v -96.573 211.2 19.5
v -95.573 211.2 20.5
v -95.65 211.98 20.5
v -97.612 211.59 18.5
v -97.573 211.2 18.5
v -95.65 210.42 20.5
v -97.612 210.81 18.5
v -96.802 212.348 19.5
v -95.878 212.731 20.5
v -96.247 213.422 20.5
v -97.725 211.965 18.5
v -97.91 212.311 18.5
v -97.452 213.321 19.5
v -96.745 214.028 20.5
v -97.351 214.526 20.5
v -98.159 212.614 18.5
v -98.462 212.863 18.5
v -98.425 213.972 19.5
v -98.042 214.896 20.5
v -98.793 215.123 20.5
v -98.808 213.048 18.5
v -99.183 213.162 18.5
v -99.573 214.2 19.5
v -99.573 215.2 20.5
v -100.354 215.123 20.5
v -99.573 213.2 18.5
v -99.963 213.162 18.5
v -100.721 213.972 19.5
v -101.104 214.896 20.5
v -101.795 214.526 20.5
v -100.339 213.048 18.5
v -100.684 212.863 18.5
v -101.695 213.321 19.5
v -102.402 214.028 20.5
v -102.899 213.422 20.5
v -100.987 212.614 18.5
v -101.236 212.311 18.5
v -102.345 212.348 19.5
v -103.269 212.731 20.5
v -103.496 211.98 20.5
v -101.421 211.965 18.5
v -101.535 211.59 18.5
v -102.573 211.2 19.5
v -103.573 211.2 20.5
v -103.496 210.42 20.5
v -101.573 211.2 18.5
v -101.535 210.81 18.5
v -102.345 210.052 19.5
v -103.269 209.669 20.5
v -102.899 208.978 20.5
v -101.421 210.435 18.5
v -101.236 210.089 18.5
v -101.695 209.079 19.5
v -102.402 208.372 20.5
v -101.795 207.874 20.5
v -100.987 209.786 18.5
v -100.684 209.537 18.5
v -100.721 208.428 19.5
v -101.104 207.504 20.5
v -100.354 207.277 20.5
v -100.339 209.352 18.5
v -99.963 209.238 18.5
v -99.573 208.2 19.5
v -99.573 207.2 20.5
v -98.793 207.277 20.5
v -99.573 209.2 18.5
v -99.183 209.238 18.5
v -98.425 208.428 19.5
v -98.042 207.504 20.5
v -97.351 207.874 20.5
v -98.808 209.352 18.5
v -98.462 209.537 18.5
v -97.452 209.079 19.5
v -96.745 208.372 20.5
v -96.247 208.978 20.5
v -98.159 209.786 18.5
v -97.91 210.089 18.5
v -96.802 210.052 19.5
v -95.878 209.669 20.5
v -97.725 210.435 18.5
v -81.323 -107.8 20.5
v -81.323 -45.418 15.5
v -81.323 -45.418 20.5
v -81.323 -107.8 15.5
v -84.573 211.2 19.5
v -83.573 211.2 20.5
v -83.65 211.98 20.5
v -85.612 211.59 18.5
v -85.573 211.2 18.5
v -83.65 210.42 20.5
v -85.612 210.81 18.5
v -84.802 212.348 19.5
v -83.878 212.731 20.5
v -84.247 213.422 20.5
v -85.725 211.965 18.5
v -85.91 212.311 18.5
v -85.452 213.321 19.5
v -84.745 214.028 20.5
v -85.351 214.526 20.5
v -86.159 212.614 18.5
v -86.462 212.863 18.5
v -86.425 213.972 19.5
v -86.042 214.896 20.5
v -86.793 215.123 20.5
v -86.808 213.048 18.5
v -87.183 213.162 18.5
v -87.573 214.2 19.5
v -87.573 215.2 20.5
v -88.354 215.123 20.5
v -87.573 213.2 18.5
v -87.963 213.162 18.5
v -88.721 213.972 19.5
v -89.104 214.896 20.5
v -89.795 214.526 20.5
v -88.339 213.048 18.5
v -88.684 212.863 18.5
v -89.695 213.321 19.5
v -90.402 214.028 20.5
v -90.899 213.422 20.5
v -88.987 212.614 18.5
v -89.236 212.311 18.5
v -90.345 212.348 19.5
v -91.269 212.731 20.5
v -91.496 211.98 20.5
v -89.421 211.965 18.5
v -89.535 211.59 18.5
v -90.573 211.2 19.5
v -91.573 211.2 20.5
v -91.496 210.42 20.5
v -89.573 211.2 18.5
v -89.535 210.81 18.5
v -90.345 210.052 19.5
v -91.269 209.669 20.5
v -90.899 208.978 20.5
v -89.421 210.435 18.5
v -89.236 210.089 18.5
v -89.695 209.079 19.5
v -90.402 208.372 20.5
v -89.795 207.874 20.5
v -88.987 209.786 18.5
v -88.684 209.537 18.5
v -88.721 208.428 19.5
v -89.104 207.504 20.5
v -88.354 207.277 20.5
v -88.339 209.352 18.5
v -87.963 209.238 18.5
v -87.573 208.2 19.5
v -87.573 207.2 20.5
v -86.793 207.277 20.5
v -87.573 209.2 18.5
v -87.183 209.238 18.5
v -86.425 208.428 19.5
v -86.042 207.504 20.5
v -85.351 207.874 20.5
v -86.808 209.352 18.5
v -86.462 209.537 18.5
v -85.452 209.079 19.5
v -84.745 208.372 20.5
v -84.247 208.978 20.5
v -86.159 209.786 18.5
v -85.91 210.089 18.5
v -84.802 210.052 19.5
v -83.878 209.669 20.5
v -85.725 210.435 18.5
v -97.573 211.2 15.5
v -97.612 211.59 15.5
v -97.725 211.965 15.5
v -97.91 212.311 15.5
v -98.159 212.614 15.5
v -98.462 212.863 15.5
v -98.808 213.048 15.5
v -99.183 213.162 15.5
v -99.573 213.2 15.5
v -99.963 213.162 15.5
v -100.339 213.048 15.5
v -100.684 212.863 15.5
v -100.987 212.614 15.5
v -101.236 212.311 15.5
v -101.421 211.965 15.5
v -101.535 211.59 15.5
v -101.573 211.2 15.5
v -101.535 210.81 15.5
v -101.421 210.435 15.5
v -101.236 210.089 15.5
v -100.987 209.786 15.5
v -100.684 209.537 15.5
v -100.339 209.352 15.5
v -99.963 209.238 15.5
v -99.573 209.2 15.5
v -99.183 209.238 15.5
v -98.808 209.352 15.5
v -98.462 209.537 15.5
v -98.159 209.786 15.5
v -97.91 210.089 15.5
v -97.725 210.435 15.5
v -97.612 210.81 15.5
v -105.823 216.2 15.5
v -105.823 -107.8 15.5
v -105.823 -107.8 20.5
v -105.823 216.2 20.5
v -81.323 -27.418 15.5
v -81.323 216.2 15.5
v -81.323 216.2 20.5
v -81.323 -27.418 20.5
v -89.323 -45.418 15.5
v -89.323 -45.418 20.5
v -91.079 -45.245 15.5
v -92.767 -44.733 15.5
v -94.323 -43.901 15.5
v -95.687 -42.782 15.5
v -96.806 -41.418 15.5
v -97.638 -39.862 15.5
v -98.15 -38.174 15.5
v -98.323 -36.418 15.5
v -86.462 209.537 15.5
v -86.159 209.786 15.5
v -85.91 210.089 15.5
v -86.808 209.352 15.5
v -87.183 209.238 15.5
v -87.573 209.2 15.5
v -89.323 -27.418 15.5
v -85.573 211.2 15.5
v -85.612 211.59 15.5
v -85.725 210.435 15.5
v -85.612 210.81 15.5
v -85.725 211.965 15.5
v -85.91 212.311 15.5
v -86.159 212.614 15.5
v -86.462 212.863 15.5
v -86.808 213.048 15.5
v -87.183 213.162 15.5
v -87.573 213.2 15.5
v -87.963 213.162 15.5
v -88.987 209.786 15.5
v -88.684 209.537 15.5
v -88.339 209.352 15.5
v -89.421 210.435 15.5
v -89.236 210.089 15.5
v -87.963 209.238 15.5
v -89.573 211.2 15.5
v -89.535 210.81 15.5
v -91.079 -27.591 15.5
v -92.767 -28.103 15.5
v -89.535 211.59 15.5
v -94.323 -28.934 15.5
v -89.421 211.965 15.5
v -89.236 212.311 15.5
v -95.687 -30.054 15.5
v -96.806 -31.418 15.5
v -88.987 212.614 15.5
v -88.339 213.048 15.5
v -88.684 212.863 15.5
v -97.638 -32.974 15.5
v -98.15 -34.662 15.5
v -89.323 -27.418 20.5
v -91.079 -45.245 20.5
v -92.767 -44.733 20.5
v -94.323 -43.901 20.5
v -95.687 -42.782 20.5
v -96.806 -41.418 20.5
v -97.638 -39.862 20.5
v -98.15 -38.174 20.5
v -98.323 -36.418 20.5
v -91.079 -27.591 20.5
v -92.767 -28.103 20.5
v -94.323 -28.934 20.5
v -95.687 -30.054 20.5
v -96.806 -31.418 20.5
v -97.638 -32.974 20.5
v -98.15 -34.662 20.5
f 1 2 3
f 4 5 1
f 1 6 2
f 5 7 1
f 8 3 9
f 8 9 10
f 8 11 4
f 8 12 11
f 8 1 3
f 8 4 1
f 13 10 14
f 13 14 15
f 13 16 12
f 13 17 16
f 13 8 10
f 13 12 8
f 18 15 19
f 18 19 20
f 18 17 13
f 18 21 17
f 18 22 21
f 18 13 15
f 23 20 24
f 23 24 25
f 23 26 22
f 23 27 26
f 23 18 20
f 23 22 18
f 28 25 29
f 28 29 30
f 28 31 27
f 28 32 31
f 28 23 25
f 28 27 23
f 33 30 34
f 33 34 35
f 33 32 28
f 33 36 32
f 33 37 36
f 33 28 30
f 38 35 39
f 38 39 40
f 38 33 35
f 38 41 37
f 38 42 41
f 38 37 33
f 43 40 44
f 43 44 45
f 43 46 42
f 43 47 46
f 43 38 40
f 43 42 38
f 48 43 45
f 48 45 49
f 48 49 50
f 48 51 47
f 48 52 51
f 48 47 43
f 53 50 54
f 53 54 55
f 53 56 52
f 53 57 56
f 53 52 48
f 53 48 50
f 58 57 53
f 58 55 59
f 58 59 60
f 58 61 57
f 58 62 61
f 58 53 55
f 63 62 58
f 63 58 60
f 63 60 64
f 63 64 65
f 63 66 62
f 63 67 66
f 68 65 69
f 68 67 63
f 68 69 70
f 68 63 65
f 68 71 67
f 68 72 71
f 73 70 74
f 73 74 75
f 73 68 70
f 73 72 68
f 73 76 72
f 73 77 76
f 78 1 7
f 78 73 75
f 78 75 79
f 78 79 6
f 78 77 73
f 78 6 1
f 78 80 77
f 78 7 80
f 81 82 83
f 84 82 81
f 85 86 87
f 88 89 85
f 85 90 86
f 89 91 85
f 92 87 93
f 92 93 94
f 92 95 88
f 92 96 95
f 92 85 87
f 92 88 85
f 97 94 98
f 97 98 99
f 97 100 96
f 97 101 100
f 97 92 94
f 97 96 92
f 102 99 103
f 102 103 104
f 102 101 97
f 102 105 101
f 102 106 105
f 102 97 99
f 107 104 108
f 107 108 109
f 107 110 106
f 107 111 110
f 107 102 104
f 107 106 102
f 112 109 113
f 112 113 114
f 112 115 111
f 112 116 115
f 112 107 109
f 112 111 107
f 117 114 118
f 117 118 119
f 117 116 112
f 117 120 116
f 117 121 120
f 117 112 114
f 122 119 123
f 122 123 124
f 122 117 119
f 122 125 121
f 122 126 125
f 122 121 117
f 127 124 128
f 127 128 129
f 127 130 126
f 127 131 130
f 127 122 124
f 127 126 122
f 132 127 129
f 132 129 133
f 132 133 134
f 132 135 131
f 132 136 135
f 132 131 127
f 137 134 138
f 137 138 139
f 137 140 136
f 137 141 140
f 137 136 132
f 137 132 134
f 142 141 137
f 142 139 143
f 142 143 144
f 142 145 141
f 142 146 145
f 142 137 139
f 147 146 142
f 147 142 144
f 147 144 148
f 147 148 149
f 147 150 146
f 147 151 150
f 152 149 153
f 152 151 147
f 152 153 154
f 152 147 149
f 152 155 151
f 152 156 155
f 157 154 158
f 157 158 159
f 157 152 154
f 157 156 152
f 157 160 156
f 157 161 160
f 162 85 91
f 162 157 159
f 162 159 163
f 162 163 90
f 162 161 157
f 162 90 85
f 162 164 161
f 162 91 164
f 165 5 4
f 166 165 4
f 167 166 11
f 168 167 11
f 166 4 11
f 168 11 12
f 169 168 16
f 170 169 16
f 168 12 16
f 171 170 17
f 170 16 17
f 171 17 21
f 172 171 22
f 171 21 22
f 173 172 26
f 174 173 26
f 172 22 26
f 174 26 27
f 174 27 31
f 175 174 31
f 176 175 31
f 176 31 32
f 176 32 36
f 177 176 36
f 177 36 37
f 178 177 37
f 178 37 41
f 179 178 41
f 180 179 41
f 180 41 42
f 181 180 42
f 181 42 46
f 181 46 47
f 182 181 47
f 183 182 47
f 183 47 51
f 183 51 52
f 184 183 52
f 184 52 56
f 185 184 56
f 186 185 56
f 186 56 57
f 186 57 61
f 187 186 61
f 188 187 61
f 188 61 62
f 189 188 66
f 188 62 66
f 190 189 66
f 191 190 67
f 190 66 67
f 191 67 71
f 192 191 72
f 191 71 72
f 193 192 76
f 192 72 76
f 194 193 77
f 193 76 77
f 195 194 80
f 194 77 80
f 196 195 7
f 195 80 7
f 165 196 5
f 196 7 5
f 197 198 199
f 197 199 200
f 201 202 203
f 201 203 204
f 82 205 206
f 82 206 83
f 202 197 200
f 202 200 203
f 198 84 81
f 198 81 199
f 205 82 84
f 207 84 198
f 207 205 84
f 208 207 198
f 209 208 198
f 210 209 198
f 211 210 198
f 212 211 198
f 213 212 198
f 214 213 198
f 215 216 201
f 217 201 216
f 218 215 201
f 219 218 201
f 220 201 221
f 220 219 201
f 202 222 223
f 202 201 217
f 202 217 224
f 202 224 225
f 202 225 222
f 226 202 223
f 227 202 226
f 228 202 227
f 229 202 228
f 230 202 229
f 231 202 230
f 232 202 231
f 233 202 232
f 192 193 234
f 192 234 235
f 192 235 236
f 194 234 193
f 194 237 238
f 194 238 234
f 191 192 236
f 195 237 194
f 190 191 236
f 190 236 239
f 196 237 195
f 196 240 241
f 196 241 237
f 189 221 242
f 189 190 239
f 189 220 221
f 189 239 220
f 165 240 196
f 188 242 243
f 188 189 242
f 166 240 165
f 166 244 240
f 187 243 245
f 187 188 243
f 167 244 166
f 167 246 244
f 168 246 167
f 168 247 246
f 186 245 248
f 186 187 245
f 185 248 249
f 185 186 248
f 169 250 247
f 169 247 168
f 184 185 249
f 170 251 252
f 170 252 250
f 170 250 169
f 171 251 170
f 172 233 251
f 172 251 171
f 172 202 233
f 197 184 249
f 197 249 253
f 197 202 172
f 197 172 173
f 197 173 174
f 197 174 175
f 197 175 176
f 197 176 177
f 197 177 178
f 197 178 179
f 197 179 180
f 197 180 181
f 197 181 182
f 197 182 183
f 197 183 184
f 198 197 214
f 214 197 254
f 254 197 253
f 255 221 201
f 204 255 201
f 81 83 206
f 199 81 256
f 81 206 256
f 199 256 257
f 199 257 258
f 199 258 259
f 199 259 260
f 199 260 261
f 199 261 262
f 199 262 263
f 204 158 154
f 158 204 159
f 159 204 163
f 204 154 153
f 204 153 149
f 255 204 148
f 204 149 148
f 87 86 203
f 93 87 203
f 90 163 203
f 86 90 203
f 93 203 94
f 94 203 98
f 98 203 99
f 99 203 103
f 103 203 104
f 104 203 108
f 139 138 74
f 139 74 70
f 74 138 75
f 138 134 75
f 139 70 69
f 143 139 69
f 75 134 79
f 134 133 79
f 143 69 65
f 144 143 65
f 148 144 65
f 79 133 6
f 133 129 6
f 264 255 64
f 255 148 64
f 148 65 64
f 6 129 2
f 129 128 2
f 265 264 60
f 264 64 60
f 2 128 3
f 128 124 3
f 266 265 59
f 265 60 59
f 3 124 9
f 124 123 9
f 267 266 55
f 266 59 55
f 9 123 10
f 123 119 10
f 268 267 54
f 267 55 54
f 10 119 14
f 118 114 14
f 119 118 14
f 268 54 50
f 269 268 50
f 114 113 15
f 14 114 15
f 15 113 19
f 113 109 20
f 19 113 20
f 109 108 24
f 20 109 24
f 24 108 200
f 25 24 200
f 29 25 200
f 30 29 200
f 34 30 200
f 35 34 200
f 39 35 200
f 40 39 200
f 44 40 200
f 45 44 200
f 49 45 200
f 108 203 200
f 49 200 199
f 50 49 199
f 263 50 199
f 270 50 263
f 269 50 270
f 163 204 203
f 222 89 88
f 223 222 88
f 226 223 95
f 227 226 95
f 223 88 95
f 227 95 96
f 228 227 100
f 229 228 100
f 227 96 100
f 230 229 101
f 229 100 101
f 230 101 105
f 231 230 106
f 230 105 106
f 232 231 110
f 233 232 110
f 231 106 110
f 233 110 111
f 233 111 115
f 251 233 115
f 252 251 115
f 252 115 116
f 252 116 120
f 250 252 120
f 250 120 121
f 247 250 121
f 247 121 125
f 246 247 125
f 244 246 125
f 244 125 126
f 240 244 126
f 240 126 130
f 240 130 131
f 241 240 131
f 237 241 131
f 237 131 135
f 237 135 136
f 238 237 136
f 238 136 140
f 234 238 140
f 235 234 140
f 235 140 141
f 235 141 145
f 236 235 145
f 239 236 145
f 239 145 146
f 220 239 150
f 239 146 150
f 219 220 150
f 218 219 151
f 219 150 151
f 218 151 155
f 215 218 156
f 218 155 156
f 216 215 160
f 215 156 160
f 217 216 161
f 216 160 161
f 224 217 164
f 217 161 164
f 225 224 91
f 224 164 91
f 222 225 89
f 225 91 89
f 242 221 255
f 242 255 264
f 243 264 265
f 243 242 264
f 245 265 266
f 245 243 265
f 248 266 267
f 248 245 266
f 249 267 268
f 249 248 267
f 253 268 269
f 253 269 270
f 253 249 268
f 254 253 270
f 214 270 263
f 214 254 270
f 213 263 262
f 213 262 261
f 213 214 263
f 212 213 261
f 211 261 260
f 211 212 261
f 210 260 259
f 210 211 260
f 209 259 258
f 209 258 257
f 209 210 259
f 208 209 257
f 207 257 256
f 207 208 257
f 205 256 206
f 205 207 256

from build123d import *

# Parameters (mm, degrees)
PAD026_DEPTH    = 5
SKETCH058_R     = 2
POCKET036_DEPTH = 5.001
CHAMFER020_SIZE = 2


with BuildPart() as part:
    # Sketch053 → Pad026 (new body)
    with BuildSketch(Plane.XY):
        with BuildLine():
            Line((-81.323184, -45.417713), (-81.323184, -107.8))
            Line((-81.323184, -107.8), (-105.823184, -107.8))
            Line((-105.823184, -107.8), (-105.823184, 216.2))
            Line((-105.823184, 216.2), (-81.323184, 216.2))
            Line((-81.323184, 216.2), (-81.323184, -27.417713))
            Line((-89.323184, -27.417713), (-81.323184, -27.417713))
            ThreePointArc((-89.323184, -27.417713), (-98.323184, -36.417713), (-89.323184, -45.417713))
            Line((-89.323184, -45.417713), (-81.323184, -45.417713))
        make_face()
    extrude(amount=PAD026_DEPTH)

    # Sketch058 (on Face10 of Pad026) → Pocket036 (cut, through all)
    with BuildSketch(Plane.XY.offset(5)):
        with Locations((-99.573184, 211.2)):
            Circle(SKETCH058_R)
        with Locations((-87.573184, 211.2)):
            Circle(SKETCH058_R)
    extrude(amount=-POCKET036_DEPTH, mode=Mode.SUBTRACT)

    # Chamfer020
    chamfer020_edges = [part.edges().sort_by_distance(p)[0] for p in [
        (-89.573184, 211.2, 5),
        (-101.573184, 211.2, 5),
    ]]
    chamfer(chamfer020_edges, length=CHAMFER020_SIZE)


with BuildPart() as part_1:
    # Body019 placement: moved
    add(part.part.moved(Location((0, 0, 15.5))))


solid = part_1.part
